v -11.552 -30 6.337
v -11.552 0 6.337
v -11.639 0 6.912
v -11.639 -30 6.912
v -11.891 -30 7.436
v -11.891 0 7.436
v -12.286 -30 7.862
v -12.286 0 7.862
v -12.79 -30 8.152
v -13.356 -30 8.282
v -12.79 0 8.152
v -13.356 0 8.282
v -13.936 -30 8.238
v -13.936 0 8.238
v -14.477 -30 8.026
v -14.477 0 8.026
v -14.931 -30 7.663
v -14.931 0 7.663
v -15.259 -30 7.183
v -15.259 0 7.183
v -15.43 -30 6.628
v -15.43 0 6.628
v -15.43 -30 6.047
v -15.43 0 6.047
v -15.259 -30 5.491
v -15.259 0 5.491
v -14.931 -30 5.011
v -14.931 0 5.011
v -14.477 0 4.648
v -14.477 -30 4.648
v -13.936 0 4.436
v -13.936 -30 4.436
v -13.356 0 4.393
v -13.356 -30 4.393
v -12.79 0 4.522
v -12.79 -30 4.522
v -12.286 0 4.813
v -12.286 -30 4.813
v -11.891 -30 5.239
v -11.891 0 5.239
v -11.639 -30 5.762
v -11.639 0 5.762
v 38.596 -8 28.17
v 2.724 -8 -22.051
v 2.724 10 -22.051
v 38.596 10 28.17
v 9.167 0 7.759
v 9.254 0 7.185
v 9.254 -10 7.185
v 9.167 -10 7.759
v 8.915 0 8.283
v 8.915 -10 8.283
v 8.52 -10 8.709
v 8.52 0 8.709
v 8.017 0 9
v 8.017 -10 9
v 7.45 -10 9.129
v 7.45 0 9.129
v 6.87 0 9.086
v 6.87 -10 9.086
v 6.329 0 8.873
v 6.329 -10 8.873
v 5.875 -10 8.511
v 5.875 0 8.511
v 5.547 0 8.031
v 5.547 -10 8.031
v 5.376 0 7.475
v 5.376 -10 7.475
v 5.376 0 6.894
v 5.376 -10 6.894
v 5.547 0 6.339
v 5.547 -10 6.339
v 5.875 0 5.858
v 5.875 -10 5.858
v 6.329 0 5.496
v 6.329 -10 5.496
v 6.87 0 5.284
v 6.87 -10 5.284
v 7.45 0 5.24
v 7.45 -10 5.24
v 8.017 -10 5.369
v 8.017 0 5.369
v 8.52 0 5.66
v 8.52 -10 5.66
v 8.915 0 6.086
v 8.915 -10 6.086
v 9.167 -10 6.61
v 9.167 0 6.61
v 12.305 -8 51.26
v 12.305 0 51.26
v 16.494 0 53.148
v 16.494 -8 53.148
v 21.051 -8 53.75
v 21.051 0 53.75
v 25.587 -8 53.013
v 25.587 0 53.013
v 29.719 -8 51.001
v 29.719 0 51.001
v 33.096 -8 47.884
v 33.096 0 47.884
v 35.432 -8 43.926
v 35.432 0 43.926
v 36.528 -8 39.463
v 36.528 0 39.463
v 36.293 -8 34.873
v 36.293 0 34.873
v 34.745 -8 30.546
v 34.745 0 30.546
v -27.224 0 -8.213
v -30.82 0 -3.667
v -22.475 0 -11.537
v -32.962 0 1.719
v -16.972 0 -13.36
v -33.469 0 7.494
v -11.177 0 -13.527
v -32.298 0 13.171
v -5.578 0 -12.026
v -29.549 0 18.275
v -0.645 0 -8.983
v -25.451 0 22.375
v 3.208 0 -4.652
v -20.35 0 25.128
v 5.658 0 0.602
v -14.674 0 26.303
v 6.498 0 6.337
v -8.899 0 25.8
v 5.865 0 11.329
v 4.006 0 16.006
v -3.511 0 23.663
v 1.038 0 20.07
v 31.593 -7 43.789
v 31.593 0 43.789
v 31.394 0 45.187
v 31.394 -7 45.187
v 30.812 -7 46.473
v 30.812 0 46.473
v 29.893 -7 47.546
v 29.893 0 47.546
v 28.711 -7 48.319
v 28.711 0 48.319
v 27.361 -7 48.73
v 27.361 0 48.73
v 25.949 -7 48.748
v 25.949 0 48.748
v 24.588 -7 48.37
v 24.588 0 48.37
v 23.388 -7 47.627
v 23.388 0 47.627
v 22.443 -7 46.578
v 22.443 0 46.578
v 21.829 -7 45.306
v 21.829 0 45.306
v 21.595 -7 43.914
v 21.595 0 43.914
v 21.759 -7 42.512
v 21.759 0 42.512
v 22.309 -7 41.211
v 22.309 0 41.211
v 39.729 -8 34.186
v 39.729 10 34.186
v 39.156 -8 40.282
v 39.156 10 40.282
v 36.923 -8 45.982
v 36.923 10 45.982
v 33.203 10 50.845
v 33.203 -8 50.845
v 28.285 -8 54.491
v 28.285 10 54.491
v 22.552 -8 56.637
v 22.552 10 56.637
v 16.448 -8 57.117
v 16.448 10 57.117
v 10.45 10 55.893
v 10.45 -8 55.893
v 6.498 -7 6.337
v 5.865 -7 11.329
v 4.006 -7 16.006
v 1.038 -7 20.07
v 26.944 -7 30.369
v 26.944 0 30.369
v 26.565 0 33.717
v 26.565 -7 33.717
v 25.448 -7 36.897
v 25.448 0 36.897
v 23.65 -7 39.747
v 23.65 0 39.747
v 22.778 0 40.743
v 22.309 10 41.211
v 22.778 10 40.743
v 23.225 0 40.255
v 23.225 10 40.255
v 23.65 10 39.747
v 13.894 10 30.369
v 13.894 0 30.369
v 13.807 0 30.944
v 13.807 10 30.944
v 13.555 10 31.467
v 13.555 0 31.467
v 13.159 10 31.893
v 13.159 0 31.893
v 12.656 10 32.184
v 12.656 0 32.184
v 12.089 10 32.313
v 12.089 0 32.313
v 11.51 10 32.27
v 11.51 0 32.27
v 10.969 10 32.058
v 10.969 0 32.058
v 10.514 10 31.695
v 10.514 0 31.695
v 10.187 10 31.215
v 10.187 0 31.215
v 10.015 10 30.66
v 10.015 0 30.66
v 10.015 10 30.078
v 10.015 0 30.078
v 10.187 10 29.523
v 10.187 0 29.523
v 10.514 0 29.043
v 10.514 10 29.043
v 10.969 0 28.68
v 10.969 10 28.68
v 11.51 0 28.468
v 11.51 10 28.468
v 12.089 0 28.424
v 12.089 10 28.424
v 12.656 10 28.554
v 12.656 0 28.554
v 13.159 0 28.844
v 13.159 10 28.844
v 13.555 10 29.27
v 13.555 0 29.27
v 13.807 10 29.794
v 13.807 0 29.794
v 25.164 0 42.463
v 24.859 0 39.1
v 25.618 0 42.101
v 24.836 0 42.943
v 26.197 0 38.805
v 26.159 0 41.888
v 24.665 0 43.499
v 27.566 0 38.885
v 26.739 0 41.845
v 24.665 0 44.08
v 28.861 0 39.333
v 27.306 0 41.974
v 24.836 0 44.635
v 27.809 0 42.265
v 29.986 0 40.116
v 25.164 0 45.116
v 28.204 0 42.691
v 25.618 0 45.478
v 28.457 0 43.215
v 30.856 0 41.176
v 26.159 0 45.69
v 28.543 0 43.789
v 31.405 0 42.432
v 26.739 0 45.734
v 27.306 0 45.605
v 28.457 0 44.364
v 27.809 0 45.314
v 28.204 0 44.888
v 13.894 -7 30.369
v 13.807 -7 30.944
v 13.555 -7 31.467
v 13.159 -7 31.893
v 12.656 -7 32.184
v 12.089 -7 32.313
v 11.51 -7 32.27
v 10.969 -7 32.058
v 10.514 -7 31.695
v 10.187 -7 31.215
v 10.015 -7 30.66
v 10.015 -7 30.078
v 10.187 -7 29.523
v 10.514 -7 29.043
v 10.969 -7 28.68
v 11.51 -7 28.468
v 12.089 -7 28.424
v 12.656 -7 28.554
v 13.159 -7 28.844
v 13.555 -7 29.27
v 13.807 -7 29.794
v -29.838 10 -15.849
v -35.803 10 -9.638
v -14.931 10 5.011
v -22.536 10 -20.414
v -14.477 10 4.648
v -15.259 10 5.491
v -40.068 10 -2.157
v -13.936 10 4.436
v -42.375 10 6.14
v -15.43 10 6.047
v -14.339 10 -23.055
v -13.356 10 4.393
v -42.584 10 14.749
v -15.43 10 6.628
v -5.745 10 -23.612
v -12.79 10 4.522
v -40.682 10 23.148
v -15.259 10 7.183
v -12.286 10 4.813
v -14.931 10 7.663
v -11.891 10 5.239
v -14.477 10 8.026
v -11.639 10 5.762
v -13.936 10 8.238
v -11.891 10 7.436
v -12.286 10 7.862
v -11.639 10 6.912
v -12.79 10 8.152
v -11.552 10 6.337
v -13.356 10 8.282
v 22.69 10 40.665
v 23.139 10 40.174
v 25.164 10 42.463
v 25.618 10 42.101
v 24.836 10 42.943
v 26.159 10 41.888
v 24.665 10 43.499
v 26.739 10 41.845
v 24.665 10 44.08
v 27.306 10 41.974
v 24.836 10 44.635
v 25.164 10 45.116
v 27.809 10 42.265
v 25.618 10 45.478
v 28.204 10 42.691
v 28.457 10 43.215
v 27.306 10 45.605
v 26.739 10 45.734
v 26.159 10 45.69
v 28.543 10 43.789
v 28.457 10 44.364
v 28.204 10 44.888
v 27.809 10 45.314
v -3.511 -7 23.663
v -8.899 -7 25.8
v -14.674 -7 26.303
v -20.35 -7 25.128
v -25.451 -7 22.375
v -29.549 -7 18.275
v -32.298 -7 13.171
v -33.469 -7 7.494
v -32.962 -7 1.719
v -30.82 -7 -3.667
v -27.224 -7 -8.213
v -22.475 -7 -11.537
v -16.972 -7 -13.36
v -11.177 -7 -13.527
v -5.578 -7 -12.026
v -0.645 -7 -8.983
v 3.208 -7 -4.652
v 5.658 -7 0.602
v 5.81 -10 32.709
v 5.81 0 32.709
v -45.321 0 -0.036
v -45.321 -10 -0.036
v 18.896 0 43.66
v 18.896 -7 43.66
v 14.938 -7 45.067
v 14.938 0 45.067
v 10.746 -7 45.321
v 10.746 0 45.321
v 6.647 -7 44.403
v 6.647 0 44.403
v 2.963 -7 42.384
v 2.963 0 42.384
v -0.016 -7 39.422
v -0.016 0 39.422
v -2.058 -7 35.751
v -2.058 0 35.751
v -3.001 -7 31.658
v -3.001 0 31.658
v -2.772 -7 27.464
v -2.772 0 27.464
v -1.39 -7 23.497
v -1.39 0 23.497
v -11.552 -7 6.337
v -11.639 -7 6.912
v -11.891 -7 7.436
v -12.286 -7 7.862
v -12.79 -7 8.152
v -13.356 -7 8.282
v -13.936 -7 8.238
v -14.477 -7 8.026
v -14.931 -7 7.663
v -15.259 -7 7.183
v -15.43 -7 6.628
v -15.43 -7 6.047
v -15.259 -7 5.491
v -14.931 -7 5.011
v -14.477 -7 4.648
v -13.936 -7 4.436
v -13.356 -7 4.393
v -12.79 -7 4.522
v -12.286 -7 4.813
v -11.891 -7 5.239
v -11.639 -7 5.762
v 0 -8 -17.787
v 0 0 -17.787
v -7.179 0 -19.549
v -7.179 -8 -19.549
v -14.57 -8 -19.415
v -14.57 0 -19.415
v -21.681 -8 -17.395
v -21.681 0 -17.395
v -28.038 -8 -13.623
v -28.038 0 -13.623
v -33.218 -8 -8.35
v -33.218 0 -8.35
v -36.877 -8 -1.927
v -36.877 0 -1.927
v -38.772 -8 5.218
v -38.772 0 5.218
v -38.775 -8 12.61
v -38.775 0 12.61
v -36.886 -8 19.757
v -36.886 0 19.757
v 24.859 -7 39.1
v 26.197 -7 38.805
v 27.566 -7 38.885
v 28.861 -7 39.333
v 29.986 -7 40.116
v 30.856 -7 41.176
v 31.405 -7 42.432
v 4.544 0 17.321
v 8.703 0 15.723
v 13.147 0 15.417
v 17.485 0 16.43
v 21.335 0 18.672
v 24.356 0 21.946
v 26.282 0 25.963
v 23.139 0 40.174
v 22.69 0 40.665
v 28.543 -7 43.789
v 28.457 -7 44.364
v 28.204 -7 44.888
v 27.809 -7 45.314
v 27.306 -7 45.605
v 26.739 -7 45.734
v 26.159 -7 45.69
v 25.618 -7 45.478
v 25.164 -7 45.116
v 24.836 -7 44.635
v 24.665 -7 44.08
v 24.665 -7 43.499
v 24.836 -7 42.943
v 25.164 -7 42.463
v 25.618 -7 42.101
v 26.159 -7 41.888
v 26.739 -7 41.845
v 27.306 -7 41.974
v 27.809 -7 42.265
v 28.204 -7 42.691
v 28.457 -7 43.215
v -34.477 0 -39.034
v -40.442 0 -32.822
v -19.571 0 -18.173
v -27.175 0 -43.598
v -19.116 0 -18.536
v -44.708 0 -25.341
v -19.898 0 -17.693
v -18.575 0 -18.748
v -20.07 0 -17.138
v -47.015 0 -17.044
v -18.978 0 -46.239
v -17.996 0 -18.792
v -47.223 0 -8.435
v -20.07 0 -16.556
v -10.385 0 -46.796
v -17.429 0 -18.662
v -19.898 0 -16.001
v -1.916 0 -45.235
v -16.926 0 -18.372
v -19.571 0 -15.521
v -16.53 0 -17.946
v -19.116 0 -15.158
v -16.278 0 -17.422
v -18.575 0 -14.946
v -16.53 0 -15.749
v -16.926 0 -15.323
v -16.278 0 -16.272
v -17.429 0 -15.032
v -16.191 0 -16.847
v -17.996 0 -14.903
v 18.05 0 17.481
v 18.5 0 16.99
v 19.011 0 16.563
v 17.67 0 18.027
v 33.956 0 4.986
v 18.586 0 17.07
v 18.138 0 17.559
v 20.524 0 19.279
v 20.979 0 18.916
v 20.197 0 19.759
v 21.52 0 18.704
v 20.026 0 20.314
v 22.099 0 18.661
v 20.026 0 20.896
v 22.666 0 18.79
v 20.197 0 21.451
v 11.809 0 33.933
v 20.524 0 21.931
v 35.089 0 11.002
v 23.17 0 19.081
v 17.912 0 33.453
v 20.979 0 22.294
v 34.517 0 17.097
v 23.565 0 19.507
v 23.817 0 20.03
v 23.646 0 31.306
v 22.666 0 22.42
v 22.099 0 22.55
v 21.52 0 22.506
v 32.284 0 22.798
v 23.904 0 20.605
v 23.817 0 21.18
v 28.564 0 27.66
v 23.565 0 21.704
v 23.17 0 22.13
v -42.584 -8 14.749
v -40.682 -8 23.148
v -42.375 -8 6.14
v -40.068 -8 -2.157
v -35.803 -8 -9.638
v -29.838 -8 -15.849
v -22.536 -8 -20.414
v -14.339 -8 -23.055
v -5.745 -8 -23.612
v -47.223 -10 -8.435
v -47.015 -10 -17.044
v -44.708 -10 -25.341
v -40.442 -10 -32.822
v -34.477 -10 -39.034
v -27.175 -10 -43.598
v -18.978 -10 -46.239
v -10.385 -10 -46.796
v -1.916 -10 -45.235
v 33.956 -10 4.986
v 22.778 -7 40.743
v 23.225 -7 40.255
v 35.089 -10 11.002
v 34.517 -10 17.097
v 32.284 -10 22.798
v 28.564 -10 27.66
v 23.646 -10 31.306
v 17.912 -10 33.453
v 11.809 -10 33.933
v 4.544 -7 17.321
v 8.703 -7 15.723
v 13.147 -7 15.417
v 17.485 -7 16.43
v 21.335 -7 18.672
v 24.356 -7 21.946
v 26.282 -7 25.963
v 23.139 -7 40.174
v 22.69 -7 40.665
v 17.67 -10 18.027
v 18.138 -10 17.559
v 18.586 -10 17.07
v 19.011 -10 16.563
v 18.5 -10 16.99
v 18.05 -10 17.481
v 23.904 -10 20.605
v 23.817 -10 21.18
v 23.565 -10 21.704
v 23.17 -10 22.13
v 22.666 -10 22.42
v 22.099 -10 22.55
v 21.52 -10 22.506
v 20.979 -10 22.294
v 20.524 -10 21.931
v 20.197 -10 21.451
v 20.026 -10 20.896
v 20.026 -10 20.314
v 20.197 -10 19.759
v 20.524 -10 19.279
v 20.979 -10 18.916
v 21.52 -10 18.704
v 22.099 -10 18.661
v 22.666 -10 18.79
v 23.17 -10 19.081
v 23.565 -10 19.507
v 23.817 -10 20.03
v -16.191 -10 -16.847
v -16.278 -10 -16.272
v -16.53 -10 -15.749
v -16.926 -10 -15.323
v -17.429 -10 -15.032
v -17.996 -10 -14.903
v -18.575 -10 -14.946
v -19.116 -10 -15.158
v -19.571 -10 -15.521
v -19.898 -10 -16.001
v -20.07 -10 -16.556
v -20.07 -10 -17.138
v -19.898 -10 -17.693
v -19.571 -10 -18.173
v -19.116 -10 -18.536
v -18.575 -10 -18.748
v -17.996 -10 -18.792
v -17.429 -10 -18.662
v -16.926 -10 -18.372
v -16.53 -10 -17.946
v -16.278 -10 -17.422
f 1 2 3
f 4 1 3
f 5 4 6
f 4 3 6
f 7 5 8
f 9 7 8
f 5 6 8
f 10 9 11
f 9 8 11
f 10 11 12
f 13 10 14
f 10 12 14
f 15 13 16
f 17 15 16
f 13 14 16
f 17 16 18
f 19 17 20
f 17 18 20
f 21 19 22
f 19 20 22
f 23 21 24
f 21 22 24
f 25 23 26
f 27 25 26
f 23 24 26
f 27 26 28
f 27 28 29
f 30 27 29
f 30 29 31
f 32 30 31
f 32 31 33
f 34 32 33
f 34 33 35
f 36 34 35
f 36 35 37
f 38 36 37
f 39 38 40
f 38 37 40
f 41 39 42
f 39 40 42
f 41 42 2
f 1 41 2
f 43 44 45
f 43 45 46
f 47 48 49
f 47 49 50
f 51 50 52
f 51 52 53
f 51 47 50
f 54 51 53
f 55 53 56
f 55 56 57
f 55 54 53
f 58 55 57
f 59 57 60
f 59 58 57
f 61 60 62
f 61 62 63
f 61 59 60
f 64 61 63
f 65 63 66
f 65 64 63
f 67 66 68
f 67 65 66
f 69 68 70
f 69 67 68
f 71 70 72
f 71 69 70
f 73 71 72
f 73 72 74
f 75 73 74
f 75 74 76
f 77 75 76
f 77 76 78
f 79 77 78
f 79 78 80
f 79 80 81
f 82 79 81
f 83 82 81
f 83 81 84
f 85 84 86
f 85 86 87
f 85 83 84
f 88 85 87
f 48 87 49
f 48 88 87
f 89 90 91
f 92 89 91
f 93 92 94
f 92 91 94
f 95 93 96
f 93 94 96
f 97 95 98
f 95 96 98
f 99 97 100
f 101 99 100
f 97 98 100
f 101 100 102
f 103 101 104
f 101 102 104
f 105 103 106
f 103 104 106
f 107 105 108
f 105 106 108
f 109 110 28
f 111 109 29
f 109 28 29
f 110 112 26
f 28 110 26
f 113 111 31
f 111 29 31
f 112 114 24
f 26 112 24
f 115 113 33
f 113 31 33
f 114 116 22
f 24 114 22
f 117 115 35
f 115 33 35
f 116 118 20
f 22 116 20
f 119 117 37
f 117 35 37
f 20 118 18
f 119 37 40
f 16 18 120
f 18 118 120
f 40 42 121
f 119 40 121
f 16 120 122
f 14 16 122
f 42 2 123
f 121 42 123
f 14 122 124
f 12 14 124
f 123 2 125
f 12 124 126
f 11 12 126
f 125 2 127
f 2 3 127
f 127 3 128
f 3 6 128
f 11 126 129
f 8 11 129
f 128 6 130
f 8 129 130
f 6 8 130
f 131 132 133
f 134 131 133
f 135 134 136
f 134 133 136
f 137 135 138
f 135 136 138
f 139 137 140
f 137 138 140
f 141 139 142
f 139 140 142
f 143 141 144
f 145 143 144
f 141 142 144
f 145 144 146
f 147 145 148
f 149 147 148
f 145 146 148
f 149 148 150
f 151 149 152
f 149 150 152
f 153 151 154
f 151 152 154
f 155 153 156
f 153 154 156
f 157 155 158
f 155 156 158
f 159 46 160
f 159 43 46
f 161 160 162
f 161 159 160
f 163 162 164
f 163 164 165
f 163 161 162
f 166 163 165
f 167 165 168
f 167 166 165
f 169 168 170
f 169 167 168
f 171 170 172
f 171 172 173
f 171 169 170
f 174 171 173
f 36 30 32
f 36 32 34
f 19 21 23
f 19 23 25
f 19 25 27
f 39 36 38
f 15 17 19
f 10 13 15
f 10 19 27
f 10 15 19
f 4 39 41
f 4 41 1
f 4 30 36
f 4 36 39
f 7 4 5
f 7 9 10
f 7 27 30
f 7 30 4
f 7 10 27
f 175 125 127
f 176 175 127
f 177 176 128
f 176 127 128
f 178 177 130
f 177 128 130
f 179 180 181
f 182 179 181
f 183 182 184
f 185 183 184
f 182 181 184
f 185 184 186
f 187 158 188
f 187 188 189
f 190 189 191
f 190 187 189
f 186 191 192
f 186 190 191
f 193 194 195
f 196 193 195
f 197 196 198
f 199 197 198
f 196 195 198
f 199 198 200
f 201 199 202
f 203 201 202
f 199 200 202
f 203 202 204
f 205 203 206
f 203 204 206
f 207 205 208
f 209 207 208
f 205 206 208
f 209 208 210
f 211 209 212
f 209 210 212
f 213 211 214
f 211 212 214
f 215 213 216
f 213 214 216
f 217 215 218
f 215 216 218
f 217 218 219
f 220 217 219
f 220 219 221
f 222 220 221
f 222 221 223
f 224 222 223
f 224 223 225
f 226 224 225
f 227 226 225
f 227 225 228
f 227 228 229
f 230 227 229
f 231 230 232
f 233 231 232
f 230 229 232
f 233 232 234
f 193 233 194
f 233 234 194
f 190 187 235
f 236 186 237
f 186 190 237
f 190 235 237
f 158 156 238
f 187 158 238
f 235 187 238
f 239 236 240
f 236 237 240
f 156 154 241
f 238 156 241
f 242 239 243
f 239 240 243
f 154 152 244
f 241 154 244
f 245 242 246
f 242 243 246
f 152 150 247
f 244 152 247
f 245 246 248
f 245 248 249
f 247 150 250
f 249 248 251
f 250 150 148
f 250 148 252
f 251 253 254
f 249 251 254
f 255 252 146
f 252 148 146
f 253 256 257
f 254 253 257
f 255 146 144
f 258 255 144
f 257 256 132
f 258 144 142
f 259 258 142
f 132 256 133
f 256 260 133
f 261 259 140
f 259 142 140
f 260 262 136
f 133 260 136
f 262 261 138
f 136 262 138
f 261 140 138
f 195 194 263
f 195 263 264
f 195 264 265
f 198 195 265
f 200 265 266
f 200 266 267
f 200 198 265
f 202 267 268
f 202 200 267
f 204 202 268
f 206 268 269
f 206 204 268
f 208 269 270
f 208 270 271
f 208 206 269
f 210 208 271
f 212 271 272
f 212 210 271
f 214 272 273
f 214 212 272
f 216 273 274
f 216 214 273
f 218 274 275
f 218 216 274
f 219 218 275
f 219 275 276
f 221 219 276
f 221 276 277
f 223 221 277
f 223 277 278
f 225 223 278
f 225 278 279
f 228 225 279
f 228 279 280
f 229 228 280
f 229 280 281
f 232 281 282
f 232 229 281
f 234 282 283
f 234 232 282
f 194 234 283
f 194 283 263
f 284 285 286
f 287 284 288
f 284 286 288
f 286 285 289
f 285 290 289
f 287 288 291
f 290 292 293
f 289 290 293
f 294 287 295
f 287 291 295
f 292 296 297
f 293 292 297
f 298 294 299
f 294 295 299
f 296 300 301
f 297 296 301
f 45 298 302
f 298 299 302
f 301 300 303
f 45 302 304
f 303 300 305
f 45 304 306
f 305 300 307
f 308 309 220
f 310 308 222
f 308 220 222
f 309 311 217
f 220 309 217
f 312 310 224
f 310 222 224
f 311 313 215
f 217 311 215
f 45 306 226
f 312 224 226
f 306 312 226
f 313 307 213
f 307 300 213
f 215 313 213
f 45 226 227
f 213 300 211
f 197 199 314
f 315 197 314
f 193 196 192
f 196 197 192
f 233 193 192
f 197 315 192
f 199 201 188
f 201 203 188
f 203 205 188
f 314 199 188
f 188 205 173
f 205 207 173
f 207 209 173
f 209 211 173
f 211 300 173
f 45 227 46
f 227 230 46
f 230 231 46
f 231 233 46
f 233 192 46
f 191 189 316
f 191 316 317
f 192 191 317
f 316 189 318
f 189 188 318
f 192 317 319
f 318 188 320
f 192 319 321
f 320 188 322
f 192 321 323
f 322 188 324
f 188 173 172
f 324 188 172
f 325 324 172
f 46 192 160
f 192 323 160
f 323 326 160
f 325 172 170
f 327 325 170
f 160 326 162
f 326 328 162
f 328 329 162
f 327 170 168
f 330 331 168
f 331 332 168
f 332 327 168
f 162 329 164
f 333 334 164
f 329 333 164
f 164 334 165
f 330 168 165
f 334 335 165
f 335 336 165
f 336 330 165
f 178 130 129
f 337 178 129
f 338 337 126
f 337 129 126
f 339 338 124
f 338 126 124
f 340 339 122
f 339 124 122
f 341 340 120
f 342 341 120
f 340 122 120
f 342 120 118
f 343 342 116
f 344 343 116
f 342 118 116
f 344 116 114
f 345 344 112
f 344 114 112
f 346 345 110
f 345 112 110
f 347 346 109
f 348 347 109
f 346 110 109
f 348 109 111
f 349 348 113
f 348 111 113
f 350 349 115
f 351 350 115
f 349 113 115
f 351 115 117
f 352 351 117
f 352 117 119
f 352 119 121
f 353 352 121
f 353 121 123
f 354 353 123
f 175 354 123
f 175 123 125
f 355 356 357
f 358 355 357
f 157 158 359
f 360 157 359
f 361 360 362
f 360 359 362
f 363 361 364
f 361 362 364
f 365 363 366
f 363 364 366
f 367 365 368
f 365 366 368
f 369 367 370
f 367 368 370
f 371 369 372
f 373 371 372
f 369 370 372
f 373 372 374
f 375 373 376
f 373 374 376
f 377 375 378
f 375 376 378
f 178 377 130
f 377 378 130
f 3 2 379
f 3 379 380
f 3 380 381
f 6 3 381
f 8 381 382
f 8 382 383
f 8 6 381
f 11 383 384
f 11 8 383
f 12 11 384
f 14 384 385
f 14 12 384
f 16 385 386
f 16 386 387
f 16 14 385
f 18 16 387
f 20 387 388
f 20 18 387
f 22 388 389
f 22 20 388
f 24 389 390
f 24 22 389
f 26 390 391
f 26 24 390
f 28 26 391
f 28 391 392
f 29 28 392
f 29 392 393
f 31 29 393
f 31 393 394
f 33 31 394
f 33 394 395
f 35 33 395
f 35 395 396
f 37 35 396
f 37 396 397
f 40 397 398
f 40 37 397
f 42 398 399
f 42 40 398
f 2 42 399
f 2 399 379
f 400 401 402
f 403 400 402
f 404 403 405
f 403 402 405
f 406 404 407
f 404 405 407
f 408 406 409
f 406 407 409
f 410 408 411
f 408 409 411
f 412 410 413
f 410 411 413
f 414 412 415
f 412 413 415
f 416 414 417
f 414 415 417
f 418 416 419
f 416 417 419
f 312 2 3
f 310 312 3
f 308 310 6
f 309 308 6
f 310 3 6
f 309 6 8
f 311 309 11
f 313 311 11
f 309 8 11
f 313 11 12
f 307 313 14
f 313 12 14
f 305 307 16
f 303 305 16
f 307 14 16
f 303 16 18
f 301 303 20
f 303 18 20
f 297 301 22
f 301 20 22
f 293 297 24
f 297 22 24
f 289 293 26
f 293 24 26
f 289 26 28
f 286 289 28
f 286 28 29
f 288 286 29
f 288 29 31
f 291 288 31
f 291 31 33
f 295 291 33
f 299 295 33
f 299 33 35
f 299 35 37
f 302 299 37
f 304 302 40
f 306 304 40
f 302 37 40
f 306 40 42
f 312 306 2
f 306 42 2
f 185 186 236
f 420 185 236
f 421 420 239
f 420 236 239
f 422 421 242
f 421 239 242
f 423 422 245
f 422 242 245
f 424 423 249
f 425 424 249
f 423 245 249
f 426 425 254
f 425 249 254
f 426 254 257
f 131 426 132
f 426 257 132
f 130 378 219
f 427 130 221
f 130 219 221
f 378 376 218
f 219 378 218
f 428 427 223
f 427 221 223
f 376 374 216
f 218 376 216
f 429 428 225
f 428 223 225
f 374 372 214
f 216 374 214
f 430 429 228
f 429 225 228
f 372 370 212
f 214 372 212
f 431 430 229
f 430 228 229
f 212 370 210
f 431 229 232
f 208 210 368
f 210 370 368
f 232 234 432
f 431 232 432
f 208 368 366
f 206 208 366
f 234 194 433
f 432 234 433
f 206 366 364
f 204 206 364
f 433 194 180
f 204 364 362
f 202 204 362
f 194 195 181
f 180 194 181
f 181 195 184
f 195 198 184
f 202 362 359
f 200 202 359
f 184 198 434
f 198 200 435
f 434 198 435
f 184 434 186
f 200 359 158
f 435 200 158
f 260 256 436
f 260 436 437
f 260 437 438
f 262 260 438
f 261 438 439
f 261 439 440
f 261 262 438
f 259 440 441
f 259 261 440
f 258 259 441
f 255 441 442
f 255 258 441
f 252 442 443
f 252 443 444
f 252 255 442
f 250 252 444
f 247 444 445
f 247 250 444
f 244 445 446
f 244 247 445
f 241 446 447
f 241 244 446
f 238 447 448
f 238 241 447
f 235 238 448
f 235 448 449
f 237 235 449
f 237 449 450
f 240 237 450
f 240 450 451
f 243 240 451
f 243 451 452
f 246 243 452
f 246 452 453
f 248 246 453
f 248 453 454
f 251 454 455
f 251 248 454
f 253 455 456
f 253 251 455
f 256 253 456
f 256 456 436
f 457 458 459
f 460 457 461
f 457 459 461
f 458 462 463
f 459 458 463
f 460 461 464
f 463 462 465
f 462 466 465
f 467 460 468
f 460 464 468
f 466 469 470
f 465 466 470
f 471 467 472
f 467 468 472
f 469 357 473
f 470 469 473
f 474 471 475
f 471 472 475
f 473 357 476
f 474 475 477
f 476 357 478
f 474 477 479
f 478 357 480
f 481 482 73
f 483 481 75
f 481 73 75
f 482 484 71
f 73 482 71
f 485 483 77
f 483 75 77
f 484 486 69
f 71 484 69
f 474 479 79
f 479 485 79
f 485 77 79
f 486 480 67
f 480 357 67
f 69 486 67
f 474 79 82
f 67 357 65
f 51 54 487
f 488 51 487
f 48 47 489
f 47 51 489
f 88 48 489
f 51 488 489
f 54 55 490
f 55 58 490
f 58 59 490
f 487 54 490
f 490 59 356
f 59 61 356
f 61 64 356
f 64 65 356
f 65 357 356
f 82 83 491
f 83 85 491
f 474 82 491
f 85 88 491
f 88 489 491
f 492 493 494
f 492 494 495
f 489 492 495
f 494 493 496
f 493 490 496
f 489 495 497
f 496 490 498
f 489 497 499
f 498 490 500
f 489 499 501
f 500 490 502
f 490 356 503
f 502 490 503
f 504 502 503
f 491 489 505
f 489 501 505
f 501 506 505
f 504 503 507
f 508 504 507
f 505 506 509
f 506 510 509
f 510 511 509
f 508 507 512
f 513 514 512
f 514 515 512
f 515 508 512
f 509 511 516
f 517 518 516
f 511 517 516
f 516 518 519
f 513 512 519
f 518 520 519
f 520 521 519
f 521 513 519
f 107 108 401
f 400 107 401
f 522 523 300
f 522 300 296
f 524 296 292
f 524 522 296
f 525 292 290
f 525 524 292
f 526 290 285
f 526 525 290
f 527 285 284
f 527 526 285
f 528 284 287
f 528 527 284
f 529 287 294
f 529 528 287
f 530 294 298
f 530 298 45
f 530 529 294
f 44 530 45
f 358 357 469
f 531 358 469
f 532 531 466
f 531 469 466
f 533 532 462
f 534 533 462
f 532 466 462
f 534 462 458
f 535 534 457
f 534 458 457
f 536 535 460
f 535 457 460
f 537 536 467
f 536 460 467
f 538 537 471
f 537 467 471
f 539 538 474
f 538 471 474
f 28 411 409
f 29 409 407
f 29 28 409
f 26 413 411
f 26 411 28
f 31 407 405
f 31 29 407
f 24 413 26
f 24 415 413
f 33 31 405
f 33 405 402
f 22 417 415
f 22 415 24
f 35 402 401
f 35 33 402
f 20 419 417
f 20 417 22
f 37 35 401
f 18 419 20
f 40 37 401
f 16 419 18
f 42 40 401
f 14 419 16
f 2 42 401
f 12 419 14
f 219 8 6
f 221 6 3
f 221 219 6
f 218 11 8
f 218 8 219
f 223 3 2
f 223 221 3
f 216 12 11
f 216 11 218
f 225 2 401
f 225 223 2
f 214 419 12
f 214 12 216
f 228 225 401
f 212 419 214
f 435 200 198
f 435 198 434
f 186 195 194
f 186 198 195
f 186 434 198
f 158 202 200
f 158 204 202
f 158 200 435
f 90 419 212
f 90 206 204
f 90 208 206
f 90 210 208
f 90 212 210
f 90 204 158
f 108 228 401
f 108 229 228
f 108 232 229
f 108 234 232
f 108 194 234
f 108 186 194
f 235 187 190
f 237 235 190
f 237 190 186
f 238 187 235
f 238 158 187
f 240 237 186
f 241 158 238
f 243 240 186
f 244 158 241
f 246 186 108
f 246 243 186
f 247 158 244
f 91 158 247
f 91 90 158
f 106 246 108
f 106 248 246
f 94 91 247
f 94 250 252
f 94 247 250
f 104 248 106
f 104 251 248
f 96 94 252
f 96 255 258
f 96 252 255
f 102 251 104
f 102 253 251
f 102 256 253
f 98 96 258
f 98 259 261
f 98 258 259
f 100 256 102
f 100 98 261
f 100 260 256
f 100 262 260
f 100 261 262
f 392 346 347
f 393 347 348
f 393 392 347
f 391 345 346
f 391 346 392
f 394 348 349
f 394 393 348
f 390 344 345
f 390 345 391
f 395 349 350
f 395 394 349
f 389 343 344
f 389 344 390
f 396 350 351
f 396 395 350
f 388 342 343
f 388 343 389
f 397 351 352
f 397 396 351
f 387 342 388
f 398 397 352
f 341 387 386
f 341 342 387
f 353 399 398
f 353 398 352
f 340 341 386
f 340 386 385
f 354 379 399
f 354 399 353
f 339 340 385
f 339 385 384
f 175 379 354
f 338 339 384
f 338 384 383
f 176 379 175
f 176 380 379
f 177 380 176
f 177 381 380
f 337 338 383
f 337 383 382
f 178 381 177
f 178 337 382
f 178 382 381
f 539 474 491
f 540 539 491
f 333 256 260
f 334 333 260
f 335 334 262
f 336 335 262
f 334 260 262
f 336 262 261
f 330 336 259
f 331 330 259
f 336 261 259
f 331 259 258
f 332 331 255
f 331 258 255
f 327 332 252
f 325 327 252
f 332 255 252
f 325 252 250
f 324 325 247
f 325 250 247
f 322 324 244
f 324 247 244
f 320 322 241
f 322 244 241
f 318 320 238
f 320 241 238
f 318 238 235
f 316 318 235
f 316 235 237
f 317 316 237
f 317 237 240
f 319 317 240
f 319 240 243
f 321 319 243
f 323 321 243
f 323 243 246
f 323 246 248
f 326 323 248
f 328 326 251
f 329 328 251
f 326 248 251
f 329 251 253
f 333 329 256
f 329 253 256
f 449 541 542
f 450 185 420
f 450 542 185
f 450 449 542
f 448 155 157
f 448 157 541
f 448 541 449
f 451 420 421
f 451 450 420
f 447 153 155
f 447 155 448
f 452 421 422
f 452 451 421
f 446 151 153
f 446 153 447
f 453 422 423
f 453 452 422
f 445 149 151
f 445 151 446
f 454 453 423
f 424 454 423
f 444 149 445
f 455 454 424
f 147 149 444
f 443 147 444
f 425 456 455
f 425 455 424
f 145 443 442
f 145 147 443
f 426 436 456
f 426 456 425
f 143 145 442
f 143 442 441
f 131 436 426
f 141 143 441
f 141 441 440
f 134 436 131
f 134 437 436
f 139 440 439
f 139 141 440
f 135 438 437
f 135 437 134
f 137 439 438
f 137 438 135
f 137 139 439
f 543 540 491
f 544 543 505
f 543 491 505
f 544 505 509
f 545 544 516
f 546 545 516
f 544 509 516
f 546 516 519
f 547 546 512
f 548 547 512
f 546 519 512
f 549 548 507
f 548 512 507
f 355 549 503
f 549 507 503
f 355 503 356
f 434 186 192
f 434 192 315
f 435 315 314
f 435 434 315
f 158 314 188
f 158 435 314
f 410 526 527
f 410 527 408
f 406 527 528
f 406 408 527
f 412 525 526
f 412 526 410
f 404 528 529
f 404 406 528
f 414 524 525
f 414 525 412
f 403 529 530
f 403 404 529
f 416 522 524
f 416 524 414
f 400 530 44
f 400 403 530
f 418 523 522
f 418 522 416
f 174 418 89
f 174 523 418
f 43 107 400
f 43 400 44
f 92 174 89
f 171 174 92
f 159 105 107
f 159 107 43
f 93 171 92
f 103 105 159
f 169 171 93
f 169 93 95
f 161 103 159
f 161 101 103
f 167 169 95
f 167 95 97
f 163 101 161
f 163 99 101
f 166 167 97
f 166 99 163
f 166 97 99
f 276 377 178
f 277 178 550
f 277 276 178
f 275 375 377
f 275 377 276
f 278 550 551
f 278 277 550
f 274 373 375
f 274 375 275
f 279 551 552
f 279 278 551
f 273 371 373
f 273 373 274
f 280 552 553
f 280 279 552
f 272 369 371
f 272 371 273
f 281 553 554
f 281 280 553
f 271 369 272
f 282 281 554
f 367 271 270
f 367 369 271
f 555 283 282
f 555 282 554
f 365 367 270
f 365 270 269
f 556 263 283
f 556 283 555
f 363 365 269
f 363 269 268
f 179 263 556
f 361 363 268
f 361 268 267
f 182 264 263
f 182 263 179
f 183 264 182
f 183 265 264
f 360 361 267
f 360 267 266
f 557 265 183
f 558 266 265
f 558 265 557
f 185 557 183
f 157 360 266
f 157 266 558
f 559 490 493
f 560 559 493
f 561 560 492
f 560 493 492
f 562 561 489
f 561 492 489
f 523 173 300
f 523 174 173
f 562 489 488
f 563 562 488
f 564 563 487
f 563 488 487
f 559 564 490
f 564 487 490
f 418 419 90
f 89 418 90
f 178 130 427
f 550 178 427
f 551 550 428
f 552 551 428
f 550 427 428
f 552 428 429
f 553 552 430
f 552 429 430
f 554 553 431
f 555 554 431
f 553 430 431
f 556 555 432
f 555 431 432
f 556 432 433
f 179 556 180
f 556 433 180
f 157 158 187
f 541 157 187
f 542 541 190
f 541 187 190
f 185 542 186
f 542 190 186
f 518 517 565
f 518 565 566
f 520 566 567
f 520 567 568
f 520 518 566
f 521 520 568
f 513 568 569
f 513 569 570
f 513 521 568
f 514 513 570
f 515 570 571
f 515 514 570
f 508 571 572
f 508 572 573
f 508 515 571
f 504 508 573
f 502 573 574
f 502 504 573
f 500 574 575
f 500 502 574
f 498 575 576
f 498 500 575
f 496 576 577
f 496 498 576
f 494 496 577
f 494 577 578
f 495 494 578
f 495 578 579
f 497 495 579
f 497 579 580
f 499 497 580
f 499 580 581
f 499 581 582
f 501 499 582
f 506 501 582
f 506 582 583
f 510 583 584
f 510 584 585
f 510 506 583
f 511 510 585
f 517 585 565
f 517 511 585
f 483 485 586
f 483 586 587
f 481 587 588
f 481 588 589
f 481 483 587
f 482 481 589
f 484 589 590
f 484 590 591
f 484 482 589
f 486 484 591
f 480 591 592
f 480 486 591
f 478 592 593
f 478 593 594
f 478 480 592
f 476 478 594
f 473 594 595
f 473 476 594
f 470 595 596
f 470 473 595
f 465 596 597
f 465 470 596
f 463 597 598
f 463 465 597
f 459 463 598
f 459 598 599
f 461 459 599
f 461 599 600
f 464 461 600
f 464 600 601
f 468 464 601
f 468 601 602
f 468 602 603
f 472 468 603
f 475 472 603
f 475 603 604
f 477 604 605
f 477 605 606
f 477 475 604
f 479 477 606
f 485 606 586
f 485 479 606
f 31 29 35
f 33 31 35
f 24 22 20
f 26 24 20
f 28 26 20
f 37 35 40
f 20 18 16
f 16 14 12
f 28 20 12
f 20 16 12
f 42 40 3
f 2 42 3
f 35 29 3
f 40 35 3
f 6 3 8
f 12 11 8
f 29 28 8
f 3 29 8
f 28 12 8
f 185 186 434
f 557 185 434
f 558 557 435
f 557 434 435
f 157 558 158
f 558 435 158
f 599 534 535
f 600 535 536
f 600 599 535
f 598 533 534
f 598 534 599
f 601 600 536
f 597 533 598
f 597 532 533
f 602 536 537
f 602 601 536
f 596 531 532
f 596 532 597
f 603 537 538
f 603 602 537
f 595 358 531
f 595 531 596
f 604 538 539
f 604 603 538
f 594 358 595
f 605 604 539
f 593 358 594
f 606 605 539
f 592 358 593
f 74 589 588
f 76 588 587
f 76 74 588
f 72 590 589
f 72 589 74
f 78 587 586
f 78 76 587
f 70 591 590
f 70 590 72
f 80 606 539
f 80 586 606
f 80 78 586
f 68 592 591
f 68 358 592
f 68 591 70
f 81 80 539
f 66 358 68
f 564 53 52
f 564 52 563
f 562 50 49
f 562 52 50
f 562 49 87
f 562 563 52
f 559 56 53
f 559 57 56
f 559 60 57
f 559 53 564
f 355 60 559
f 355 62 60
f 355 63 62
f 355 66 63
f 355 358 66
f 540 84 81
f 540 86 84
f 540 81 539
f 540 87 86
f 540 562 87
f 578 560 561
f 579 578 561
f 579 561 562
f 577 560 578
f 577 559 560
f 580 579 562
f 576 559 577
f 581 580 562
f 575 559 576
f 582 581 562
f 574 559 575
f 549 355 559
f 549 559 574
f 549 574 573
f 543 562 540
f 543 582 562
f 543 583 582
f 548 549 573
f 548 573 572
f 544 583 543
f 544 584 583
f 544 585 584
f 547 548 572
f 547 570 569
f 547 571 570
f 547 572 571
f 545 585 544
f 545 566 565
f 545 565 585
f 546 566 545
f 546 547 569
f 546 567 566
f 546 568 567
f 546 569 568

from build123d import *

# Parameters (mm, degrees)
F1_DEPTH = 8
F0_R     = 1.95
F2_DEPTH = 10
F3_R     = 1.95
F4_DEPTH = 10
F5_DEPTH = 30
F6_DEPTH = 7
F7_DEPTH = 7
F8_DEPTH = 7


with BuildPart() as f1:
    # F0 (on Front) → F1 (new body)
    with BuildSketch(Plane.XZ):
        with BuildLine():
            Line((10.4495781408, 55.8928779492), (-40.6816266477, 23.1477748603))
            ThreePointArc((-40.6816266477, 23.1477748603), (-33.0124627928, -12.9281223284), (2.7235143352, -22.0509711653))
            Line((2.7235143352, -22.0509711653), (38.5955311358, 28.1698592007))
            ThreePointArc((38.5955311358, 28.1698592007), (33.2032838752, 50.8445284722), (10.4495781408, 55.8928779492))
        make_face()
        with BuildLine():
            ThreePointArc((0, -17.7870281041), (-30.7987331987, -11.1539709039), (-36.8864415109, 19.7571795434))
            Line((-36.8864415109, 19.7571795434), (12.3046208173, 51.2597896159))
            ThreePointArc((12.3046208173, 51.2597896159), (31.5216693092, 49.5661200011), (34.74483639, 30.5457450449))
            Line((34.74483639, 30.5457450449), (0, -17.7870281041))
        make_face(mode=Mode.SUBTRACT)
    extrude(amount=F1_DEPTH)

    # F0 (on Front) → F2 (join)
    with BuildSketch(Plane.XZ):
        with BuildLine():
            Line((10.4495781408, 55.8928779492), (-40.6816266477, 23.1477748603))
            ThreePointArc((-40.6816266477, 23.1477748603), (-33.0124627928, -12.9281223284), (2.7235143352, -22.0509711653))
            Line((2.7235143352, -22.0509711653), (38.5955311358, 28.1698592007))
            ThreePointArc((38.5955311358, 28.1698592007), (33.2032838752, 50.8445284722), (10.4495781408, 55.8928779492))
        make_face()
        with BuildLine():
            ThreePointArc((0, -17.7870281041), (-30.7987331987, -11.1539709039), (-36.8864415109, 19.7571795434))
            Line((-36.8864415109, 19.7571795434), (12.3046208173, 51.2597896159))
            ThreePointArc((12.3046208173, 51.2597896159), (31.5216693092, 49.5661200011), (34.74483639, 30.5457450449))
            Line((34.74483639, 30.5457450449), (0, -17.7870281041))
        make_face(mode=Mode.SUBTRACT)
        with BuildLine():
            Line((12.3046208173, 51.2597896159), (-36.8864415109, 19.7571795434))
            ThreePointArc((-36.8864415109, 19.7571795434), (-30.7987331987, -11.1539709039), (0, -17.7870281041))
            Line((0, -17.7870281041), (34.74483639, 30.5457450449))
            ThreePointArc((34.74483639, 30.5457450449), (31.5216693092, 49.5661200011), (12.3046208173, 51.2597896159))
        make_face()
        with BuildLine():
            ThreePointArc((6.4980118465, 6.3371546272), (-32.0870104837, -1.0518199286), (1.0383173479, 20.0695803388))
            ThreePointArc((1.0383173479, 20.0695803388), (5.0830341767, 13.7261291829), (6.4980118465, 6.3371546272))
        make_face(mode=Mode.SUBTRACT)
        with BuildLine():
            ThreePointArc((22.3092190592, 41.2110779919), (25.2552786482, 48.6070210465), (31.5932027251, 43.7893494964))
            ThreePointArc((31.5932027251, 43.7893494964), (28.8609767731, 39.3332075701), (23.6503223783, 39.7471402904))
            ThreePointArc((23.6503223783, 39.7471402904), (26.0963136897, 35.338726645), (26.9435465019, 30.368899593))
            ThreePointArc((26.9435465019, 30.368899593), (17.4852773998, 16.4301328378), (1.0383173479, 20.0695803388))
            ThreePointArc((1.0383173479, 20.0695803388), (1.3693557014, 41.0078134903), (22.3092190592, 41.2110779919))
        make_face(mode=Mode.SUBTRACT)
        with BuildLine():
            ThreePointArc((23.6503223783, 39.7471402904), (22.9063789887, 40.4118754791), (22.3092190592, 41.2110779919))
            ThreePointArc((22.3092190592, 41.2110779919), (1.3693557014, 41.0078134903), (1.0383173479, 20.0695803388))
            ThreePointArc((1.0383173479, 20.0695803388), (17.4852773998, 16.4301328378), (26.9435465019, 30.368899593))
            ThreePointArc((26.9435465019, 30.368899593), (26.0963136897, 35.338726645), (23.6503223783, 39.7471402904))
        make_face()
        with Locations((11.9435465019, 30.368899593)):
            Circle(F0_R, mode=Mode.SUBTRACT)
        with BuildLine():
            ThreePointArc((6.4980118465, 6.3371546272), (5.0830341767, 13.7261291829), (1.0383173479, 20.0695803388))
            ThreePointArc((1.0383173479, 20.0695803388), (-32.0870104837, -1.0518199286), (6.4980118465, 6.3371546272))
        make_face()
        with Locations((-13.5019881535, 6.3371546272)):
            Circle(F0_R, mode=Mode.SUBTRACT)
        with BuildLine():
            ThreePointArc((23.6503223783, 39.7471402904), (28.8609767731, 39.3332075701), (31.5932027251, 43.7893494964))
            ThreePointArc((31.5932027251, 43.7893494964), (25.2552786482, 48.6070210465), (22.3092190592, 41.2110779919))
            ThreePointArc((22.3092190592, 41.2110779919), (23.0040177108, 40.5013216448), (23.6503223783, 39.7471402904))
        make_face()
        with Locations((26.5932027251, 43.7893494964)):
            Circle(F0_R, mode=Mode.SUBTRACT)
    extrude(amount=-F2_DEPTH)


with BuildPart() as f4:
    # F3 (on Front) → F4 (new body)
    with BuildSketch(Plane.XZ):
        with BuildLine():
            Line((5.8101353426, 32.7086040703), (-45.321069446, -0.0364990186))
            ThreePointArc((-45.321069446, -0.0364990186), (-37.6519055911, -36.1123962072), (-1.915928463, -45.2352450442))
            Line((-1.915928463, -45.2352450442), (33.9560883375, 4.9855853219))
            ThreePointArc((33.9560883375, 4.9855853219), (28.563841077, 27.6602545933), (5.8101353426, 32.7086040703))
        make_face()
        with BuildLine():
            ThreePointArc((-4.6394427983, -40.9713019829), (-35.438175997, -34.3382447827), (-41.5258843092, -3.4270943355))
            Line((-41.5258843092, -3.4270943355), (7.665178019, 28.075515737))
            ThreePointArc((7.665178019, 28.075515737), (26.8822265109, 26.3818461222), (30.1053935917, 7.3614711661))
            Line((30.1053935917, 7.3614711661), (-4.6394427983, -40.9713019829))
        make_face(mode=Mode.SUBTRACT)
        with BuildLine():
            Line((7.665178019, 28.075515737), (-41.5258843092, -3.4270943355))
            ThreePointArc((-41.5258843092, -3.4270943355), (-35.438175997, -34.3382447827), (-4.6394427983, -40.9713019829))
            Line((-4.6394427983, -40.9713019829), (30.1053935917, 7.3614711661))
            ThreePointArc((30.1053935917, 7.3614711661), (26.8822265109, 26.3818461222), (7.665178019, 28.075515737))
        make_face()
        with BuildLine():
            ThreePointArc((1.8585690482, -16.8471192517), (-36.7264532433, -24.2360939047), (-3.6011255941, -3.1146933879))
            ThreePointArc((-3.6011255941, -3.1146933879), (0.4435913397, -9.4581445987), (1.8585690482, -16.8471192517))
        make_face(mode=Mode.SUBTRACT)
        with BuildLine():
            ThreePointArc((17.6697762609, 18.026804113), (20.6158358499, 25.4227471676), (26.9537599268, 20.6050756175))
            ThreePointArc((26.9537599268, 20.6050756175), (24.2215339748, 16.1489336913), (19.01087958, 16.5628664116))
            ThreePointArc((19.01087958, 16.5628664116), (21.4568708914, 12.1544527661), (22.3041037036, 7.1846257141))
            ThreePointArc((22.3041037036, 7.1846257141), (12.8458345043, -6.7541410797), (-3.6011255941, -3.1146933879))
            ThreePointArc((-3.6011255941, -3.1146933879), (-3.2700870226, 17.8235396853), (17.6697762609, 18.026804113))
        make_face(mode=Mode.SUBTRACT)
        with BuildLine():
            ThreePointArc((1.8585690482, -16.8471192517), (0.4435913397, -9.4581445987), (-3.6011255941, -3.1146933879))
            ThreePointArc((-3.6011255941, -3.1146933879), (-36.7264532433, -24.2360939047), (1.8585690482, -16.8471192517))
        make_face()
        with Locations((-18.1414309518, -16.8471192517)):
            Circle(F3_R, mode=Mode.SUBTRACT)
        with BuildLine():
            ThreePointArc((19.01087958, 16.5628664116), (18.2669361905, 17.2276016002), (17.6697762609, 18.026804113))
            ThreePointArc((17.6697762609, 18.026804113), (-3.2700870226, 17.8235396853), (-3.6011255941, -3.1146933879))
            ThreePointArc((-3.6011255941, -3.1146933879), (12.8458345043, -6.7541410797), (22.3041037036, 7.1846257141))
            ThreePointArc((22.3041037036, 7.1846257141), (21.4568708914, 12.1544527661), (19.01087958, 16.5628664116))
        make_face()
        with Locations((7.3041037036, 7.1846257141)):
            Circle(F3_R, mode=Mode.SUBTRACT)
        with BuildLine():
            ThreePointArc((19.01087958, 16.5628664116), (24.2215339748, 16.1489336913), (26.9537599268, 20.6050756175))
            ThreePointArc((26.9537599268, 20.6050756175), (20.6158358499, 25.4227471676), (17.6697762609, 18.026804113))
            ThreePointArc((17.6697762609, 18.026804113), (18.3645749125, 17.3170477659), (19.01087958, 16.5628664116))
        make_face()
        with Locations((21.9537599268, 20.6050756175)):
            Circle(F3_R, mode=Mode.SUBTRACT)
    extrude(amount=F4_DEPTH)


with BuildPart() as f5:
    # F0 (on Front) → F5 (new body)
    with BuildSketch(Plane.XZ):
        with Locations((-13.5019881535, 6.3371546272)):
            Circle(F0_R)
    extrude(amount=F5_DEPTH)


with BuildPart() as f6:
    # F0 (on Front) → F6 (new body)
    with BuildSketch(Plane.XZ):
        with BuildLine():
            ThreePointArc((6.4980118465, 6.3371546272), (5.0830341767, 13.7261291829), (1.0383173479, 20.0695803388))
            ThreePointArc((1.0383173479, 20.0695803388), (-32.0870104837, -1.0518199286), (6.4980118465, 6.3371546272))
        make_face()
        with Locations((-13.5019881535, 6.3371546272)):
            Circle(F0_R, mode=Mode.SUBTRACT)
    extrude(amount=F6_DEPTH)


with BuildPart() as f7:
    # F0 (on Front) → F7 (new body)
    with BuildSketch(Plane.XZ):
        with BuildLine():
            ThreePointArc((23.6503223783, 39.7471402904), (22.9063789887, 40.4118754791), (22.3092190592, 41.2110779919))
            ThreePointArc((22.3092190592, 41.2110779919), (1.3693557014, 41.0078134903), (1.0383173479, 20.0695803388))
            ThreePointArc((1.0383173479, 20.0695803388), (17.4852773998, 16.4301328378), (26.9435465019, 30.368899593))
            ThreePointArc((26.9435465019, 30.368899593), (26.0963136897, 35.338726645), (23.6503223783, 39.7471402904))
        make_face()
        with Locations((11.9435465019, 30.368899593)):
            Circle(F0_R, mode=Mode.SUBTRACT)
    extrude(amount=F7_DEPTH)


with BuildPart() as f8:
    # F0 (on Front) → F8 (new body)
    with BuildSketch(Plane.XZ):
        with BuildLine():
            ThreePointArc((23.6503223783, 39.7471402904), (28.8609767731, 39.3332075701), (31.5932027251, 43.7893494964))
            ThreePointArc((31.5932027251, 43.7893494964), (25.2552786482, 48.6070210465), (22.3092190592, 41.2110779919))
            ThreePointArc((22.3092190592, 41.2110779919), (23.0040177108, 40.5013216448), (23.6503223783, 39.7471402904))
        make_face()
        with Locations((26.5932027251, 43.7893494964)):
            Circle(F0_R, mode=Mode.SUBTRACT)
    extrude(amount=F8_DEPTH)


solid = Compound([f1.part, f4.part, f5.part, f6.part, f7.part, f8.part])
